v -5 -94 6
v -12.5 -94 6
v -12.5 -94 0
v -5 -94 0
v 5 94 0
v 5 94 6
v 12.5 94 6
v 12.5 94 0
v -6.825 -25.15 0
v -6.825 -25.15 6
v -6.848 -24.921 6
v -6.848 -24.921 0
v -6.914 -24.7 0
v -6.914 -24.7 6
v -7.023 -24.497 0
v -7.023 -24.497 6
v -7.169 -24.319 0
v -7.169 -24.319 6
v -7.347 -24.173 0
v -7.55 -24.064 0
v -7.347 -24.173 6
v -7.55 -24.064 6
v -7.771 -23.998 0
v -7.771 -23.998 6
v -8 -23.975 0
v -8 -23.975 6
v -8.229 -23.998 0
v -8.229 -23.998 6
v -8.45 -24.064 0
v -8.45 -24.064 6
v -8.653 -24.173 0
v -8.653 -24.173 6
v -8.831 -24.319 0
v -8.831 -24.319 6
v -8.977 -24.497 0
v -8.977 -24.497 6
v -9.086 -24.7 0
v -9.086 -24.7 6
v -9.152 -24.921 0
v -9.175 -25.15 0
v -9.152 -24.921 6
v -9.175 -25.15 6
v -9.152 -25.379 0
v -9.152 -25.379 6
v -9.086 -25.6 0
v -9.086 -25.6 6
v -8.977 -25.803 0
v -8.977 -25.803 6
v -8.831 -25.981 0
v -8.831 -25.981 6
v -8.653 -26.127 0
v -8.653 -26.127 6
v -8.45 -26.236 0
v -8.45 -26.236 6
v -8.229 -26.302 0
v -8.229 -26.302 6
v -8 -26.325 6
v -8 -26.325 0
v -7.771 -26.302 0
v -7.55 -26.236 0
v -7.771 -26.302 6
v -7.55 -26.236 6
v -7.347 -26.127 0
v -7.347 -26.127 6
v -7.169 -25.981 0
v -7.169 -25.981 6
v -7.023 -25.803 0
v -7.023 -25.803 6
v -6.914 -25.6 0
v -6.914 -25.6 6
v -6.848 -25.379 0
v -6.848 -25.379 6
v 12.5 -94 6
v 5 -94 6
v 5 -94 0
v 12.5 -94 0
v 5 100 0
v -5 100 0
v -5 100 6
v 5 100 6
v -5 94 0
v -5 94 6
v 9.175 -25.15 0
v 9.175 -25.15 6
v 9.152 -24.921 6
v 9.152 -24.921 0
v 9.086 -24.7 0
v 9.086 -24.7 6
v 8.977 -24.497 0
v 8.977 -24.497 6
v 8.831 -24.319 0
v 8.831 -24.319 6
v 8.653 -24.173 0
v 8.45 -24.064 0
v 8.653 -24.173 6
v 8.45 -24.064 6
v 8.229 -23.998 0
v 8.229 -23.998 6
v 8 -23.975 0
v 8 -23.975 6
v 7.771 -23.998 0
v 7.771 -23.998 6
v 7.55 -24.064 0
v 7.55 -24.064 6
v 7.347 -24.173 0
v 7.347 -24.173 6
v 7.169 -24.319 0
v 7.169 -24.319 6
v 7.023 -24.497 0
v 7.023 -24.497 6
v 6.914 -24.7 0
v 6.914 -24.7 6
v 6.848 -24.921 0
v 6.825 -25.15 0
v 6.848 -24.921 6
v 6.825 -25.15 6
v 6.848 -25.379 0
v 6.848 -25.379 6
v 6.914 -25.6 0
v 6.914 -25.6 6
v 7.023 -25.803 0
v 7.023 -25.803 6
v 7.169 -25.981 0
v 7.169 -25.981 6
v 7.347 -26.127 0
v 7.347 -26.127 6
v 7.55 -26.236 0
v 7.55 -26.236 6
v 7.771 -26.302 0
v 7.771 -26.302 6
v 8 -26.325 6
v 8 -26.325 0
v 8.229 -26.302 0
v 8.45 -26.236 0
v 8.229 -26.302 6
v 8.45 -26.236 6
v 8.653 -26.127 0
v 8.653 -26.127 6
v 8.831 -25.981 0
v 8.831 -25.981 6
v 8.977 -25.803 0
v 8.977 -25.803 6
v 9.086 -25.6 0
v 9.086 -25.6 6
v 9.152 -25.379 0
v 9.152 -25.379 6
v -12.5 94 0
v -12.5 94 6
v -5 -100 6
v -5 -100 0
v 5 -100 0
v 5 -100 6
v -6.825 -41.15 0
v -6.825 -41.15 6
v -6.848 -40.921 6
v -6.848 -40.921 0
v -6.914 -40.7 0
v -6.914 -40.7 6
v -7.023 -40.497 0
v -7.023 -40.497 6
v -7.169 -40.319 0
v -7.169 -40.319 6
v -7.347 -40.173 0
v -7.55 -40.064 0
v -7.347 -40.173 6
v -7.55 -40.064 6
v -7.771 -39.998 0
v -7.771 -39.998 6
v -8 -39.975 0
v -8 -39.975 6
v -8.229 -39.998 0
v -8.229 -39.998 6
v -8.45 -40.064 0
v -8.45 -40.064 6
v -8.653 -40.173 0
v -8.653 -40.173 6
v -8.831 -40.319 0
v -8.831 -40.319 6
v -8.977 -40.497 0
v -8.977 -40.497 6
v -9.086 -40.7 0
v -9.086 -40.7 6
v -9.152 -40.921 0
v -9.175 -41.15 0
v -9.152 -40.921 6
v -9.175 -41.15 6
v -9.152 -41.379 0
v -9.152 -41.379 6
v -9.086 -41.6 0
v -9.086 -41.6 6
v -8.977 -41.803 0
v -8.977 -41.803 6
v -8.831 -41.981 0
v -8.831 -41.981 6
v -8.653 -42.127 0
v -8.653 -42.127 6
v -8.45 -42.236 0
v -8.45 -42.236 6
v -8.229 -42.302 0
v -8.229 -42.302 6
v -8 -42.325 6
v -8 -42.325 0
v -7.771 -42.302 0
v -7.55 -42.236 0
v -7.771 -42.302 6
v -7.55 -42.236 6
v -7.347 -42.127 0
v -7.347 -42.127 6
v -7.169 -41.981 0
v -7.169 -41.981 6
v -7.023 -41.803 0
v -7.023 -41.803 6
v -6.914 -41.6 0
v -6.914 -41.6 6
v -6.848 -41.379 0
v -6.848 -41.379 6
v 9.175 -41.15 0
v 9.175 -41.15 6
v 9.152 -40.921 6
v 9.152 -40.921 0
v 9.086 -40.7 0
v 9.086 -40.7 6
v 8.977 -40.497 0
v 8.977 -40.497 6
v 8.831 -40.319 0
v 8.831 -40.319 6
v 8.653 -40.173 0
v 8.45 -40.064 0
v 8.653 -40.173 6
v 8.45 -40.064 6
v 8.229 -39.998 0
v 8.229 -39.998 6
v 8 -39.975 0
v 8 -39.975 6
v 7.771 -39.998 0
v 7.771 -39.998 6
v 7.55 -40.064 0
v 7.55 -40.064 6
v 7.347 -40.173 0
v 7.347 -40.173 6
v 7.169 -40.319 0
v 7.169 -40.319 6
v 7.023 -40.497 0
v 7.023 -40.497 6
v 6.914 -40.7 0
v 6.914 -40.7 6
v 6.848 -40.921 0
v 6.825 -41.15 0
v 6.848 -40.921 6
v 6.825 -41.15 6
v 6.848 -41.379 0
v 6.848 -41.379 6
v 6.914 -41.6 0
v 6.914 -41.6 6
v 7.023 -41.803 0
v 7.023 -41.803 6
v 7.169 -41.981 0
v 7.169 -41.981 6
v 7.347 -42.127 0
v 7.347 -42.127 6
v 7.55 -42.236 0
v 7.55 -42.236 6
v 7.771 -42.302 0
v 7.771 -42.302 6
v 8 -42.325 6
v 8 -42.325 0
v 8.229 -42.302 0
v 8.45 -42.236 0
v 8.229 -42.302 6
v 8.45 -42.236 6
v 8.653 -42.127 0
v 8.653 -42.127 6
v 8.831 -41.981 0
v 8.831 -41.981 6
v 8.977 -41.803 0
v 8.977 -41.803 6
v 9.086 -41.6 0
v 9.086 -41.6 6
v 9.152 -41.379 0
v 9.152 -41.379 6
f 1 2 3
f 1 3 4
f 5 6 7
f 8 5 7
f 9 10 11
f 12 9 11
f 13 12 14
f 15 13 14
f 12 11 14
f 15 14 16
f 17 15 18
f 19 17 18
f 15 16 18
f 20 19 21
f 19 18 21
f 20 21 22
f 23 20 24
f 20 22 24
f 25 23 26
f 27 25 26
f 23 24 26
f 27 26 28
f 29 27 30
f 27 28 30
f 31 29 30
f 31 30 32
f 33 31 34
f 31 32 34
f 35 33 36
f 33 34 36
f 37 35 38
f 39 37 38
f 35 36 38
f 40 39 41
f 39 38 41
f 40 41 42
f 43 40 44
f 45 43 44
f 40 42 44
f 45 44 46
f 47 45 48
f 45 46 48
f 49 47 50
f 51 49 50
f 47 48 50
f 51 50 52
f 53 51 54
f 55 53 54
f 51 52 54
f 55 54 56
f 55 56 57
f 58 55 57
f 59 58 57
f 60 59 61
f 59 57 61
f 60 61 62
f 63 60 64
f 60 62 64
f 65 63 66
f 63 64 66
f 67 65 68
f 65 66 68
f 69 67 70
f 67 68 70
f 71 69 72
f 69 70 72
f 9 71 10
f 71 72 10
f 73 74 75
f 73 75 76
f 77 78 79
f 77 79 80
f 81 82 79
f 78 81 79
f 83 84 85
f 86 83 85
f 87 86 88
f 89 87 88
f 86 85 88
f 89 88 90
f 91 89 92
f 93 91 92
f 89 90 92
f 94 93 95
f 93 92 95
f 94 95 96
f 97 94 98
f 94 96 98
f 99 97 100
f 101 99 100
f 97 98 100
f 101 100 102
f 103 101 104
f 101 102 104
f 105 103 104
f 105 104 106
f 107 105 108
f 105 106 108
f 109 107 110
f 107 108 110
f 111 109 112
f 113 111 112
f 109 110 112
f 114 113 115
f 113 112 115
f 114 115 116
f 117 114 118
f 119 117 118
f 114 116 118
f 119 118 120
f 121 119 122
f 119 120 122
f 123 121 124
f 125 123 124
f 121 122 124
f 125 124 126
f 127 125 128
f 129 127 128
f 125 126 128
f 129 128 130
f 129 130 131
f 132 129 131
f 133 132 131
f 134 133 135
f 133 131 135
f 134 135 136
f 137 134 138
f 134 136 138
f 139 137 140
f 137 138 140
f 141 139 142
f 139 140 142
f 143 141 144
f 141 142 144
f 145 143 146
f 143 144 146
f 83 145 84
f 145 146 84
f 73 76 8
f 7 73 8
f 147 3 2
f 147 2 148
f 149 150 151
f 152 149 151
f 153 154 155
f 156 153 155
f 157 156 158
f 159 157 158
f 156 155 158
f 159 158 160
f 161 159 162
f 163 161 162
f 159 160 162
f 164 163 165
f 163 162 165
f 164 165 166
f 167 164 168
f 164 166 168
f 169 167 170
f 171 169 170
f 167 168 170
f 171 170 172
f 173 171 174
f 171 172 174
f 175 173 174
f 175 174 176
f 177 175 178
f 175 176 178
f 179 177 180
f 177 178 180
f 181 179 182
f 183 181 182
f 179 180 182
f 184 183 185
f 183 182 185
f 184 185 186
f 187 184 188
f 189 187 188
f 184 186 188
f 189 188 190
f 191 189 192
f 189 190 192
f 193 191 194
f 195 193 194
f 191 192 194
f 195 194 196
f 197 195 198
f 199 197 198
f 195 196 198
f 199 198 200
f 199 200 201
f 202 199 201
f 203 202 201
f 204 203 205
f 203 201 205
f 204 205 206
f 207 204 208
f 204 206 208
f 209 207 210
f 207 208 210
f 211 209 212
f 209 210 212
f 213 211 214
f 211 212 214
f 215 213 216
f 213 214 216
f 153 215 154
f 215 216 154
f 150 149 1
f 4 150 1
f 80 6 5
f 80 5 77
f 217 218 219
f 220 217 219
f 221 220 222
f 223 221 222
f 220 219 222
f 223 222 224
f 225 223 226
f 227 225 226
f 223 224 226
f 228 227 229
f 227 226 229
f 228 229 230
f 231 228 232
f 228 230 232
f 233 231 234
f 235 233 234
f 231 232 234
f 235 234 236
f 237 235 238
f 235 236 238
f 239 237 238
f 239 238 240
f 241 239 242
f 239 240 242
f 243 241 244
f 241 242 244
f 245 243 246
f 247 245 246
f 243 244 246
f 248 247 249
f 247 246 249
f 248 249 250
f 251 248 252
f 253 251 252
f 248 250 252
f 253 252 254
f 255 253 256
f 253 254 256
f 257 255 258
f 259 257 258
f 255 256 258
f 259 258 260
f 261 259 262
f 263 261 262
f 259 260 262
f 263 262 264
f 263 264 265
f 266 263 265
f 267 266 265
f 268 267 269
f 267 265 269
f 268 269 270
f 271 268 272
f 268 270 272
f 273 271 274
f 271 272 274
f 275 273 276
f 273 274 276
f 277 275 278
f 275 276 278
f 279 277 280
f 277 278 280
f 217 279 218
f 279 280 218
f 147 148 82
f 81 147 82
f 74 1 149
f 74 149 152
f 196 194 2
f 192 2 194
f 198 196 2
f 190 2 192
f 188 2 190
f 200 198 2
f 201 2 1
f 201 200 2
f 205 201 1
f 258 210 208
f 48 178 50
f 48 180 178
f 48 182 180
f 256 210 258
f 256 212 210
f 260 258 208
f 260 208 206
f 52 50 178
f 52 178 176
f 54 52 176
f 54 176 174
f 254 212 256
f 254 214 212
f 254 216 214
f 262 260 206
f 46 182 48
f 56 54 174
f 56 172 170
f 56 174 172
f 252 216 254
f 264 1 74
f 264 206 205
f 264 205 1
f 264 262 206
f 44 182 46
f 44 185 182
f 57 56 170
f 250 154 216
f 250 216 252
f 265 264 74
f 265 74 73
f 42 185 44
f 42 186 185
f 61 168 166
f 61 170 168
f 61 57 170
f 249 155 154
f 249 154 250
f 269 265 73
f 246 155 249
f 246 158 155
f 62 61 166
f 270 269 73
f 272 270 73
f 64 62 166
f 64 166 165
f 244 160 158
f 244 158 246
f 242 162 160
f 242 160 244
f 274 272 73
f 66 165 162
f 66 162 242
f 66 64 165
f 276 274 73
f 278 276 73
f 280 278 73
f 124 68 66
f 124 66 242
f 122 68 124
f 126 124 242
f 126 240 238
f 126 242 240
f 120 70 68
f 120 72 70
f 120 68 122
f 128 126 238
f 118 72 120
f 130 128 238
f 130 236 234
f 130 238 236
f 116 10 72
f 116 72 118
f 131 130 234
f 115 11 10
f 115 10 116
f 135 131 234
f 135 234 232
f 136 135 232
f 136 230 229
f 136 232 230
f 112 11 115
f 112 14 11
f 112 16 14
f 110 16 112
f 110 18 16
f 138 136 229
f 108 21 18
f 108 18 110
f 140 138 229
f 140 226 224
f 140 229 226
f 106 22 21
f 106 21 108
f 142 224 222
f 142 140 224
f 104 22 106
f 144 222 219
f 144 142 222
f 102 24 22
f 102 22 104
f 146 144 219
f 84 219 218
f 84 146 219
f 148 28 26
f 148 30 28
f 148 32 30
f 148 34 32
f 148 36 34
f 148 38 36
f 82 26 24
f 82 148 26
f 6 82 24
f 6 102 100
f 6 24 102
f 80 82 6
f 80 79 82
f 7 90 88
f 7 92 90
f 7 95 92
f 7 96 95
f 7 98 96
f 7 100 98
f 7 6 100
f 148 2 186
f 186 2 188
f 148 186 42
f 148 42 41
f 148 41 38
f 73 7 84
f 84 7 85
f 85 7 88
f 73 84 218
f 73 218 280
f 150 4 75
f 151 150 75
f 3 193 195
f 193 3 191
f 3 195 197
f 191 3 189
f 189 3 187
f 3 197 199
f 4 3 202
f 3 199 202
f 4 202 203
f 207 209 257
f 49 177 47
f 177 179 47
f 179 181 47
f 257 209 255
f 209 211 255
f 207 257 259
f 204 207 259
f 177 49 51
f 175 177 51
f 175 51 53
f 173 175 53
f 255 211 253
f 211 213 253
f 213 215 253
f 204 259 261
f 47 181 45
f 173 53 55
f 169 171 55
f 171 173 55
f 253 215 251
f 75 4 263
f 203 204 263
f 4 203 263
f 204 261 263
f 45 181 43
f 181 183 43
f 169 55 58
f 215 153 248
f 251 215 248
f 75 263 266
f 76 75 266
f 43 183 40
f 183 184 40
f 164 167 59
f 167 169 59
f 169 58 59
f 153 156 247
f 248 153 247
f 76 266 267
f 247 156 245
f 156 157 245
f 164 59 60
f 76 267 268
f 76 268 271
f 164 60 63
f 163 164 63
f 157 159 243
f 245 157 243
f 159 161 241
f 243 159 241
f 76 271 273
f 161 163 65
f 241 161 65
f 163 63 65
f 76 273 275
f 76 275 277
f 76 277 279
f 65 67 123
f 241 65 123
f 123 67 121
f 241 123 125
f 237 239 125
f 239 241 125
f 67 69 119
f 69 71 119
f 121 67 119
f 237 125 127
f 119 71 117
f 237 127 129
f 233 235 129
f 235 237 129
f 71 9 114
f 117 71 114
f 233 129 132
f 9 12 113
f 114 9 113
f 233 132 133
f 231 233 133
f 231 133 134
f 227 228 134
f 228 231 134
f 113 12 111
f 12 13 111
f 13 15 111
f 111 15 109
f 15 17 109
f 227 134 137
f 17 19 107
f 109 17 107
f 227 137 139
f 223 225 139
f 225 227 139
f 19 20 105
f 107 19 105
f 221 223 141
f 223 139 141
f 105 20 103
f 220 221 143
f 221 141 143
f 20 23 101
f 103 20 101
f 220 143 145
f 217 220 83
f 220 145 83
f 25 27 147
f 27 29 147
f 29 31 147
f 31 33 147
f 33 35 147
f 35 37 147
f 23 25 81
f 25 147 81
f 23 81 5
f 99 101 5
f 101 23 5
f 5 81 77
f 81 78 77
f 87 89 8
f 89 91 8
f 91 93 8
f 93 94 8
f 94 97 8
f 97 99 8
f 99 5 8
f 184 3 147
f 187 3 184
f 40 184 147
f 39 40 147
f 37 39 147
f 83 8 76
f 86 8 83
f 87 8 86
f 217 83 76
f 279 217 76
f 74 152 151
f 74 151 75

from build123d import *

# Parameters (mm, degrees)
ESQUISSE1_W             = 25
ESQUISSE1_H             = 200
BOSS_EXTRU_1_DEPTH      = 6
ESQUISSE2_R             = 1.175
ENL_V_MAT_EXTRU_1_DEPTH = 6
ESQUISSE3_W             = 7.5
ESQUISSE3_H             = 6
ENL_V_MAT_EXTRU_2_DEPTH = 6


with BuildPart() as part:
    # Esquisse1 → Boss.-Extru.1 (new body)
    with BuildSketch(Plane.XY):
        Rectangle(ESQUISSE1_W, ESQUISSE1_H)
    extrude(amount=BOSS_EXTRU_1_DEPTH)

    # Esquisse2 → Enlèv. mat.-Extru.1 (cut)
    with BuildSketch(Plane.XY.offset(6)):
        with Locations((8, -41.15)):
            Circle(ESQUISSE2_R)
        with Locations((-8, -41.15)):
            Circle(ESQUISSE2_R)
        with Locations((-8, -25.15)):
            Circle(ESQUISSE2_R)
        with Locations((8, -25.15)):
            Circle(ESQUISSE2_R)
    extrude(amount=-ENL_V_MAT_EXTRU_1_DEPTH, mode=Mode.SUBTRACT)

    # Esquisse3 → Enlèv. mat.-Extru.2 (cut)
    with BuildSketch(Plane.XY.offset(6)):
        with Locations((-8.75, -97)):
            Rectangle(ESQUISSE3_W, ESQUISSE3_H)
        with Locations((8.75, -97)):
            Rectangle(ESQUISSE3_W, ESQUISSE3_H)
        with Locations((8.75, 97)):
            Rectangle(ESQUISSE3_W, ESQUISSE3_H)
        with Locations((-8.75, 97)):
            Rectangle(ESQUISSE3_W, ESQUISSE3_H)
    extrude(amount=-ENL_V_MAT_EXTRU_2_DEPTH, mode=Mode.SUBTRACT)


solid = part.part
